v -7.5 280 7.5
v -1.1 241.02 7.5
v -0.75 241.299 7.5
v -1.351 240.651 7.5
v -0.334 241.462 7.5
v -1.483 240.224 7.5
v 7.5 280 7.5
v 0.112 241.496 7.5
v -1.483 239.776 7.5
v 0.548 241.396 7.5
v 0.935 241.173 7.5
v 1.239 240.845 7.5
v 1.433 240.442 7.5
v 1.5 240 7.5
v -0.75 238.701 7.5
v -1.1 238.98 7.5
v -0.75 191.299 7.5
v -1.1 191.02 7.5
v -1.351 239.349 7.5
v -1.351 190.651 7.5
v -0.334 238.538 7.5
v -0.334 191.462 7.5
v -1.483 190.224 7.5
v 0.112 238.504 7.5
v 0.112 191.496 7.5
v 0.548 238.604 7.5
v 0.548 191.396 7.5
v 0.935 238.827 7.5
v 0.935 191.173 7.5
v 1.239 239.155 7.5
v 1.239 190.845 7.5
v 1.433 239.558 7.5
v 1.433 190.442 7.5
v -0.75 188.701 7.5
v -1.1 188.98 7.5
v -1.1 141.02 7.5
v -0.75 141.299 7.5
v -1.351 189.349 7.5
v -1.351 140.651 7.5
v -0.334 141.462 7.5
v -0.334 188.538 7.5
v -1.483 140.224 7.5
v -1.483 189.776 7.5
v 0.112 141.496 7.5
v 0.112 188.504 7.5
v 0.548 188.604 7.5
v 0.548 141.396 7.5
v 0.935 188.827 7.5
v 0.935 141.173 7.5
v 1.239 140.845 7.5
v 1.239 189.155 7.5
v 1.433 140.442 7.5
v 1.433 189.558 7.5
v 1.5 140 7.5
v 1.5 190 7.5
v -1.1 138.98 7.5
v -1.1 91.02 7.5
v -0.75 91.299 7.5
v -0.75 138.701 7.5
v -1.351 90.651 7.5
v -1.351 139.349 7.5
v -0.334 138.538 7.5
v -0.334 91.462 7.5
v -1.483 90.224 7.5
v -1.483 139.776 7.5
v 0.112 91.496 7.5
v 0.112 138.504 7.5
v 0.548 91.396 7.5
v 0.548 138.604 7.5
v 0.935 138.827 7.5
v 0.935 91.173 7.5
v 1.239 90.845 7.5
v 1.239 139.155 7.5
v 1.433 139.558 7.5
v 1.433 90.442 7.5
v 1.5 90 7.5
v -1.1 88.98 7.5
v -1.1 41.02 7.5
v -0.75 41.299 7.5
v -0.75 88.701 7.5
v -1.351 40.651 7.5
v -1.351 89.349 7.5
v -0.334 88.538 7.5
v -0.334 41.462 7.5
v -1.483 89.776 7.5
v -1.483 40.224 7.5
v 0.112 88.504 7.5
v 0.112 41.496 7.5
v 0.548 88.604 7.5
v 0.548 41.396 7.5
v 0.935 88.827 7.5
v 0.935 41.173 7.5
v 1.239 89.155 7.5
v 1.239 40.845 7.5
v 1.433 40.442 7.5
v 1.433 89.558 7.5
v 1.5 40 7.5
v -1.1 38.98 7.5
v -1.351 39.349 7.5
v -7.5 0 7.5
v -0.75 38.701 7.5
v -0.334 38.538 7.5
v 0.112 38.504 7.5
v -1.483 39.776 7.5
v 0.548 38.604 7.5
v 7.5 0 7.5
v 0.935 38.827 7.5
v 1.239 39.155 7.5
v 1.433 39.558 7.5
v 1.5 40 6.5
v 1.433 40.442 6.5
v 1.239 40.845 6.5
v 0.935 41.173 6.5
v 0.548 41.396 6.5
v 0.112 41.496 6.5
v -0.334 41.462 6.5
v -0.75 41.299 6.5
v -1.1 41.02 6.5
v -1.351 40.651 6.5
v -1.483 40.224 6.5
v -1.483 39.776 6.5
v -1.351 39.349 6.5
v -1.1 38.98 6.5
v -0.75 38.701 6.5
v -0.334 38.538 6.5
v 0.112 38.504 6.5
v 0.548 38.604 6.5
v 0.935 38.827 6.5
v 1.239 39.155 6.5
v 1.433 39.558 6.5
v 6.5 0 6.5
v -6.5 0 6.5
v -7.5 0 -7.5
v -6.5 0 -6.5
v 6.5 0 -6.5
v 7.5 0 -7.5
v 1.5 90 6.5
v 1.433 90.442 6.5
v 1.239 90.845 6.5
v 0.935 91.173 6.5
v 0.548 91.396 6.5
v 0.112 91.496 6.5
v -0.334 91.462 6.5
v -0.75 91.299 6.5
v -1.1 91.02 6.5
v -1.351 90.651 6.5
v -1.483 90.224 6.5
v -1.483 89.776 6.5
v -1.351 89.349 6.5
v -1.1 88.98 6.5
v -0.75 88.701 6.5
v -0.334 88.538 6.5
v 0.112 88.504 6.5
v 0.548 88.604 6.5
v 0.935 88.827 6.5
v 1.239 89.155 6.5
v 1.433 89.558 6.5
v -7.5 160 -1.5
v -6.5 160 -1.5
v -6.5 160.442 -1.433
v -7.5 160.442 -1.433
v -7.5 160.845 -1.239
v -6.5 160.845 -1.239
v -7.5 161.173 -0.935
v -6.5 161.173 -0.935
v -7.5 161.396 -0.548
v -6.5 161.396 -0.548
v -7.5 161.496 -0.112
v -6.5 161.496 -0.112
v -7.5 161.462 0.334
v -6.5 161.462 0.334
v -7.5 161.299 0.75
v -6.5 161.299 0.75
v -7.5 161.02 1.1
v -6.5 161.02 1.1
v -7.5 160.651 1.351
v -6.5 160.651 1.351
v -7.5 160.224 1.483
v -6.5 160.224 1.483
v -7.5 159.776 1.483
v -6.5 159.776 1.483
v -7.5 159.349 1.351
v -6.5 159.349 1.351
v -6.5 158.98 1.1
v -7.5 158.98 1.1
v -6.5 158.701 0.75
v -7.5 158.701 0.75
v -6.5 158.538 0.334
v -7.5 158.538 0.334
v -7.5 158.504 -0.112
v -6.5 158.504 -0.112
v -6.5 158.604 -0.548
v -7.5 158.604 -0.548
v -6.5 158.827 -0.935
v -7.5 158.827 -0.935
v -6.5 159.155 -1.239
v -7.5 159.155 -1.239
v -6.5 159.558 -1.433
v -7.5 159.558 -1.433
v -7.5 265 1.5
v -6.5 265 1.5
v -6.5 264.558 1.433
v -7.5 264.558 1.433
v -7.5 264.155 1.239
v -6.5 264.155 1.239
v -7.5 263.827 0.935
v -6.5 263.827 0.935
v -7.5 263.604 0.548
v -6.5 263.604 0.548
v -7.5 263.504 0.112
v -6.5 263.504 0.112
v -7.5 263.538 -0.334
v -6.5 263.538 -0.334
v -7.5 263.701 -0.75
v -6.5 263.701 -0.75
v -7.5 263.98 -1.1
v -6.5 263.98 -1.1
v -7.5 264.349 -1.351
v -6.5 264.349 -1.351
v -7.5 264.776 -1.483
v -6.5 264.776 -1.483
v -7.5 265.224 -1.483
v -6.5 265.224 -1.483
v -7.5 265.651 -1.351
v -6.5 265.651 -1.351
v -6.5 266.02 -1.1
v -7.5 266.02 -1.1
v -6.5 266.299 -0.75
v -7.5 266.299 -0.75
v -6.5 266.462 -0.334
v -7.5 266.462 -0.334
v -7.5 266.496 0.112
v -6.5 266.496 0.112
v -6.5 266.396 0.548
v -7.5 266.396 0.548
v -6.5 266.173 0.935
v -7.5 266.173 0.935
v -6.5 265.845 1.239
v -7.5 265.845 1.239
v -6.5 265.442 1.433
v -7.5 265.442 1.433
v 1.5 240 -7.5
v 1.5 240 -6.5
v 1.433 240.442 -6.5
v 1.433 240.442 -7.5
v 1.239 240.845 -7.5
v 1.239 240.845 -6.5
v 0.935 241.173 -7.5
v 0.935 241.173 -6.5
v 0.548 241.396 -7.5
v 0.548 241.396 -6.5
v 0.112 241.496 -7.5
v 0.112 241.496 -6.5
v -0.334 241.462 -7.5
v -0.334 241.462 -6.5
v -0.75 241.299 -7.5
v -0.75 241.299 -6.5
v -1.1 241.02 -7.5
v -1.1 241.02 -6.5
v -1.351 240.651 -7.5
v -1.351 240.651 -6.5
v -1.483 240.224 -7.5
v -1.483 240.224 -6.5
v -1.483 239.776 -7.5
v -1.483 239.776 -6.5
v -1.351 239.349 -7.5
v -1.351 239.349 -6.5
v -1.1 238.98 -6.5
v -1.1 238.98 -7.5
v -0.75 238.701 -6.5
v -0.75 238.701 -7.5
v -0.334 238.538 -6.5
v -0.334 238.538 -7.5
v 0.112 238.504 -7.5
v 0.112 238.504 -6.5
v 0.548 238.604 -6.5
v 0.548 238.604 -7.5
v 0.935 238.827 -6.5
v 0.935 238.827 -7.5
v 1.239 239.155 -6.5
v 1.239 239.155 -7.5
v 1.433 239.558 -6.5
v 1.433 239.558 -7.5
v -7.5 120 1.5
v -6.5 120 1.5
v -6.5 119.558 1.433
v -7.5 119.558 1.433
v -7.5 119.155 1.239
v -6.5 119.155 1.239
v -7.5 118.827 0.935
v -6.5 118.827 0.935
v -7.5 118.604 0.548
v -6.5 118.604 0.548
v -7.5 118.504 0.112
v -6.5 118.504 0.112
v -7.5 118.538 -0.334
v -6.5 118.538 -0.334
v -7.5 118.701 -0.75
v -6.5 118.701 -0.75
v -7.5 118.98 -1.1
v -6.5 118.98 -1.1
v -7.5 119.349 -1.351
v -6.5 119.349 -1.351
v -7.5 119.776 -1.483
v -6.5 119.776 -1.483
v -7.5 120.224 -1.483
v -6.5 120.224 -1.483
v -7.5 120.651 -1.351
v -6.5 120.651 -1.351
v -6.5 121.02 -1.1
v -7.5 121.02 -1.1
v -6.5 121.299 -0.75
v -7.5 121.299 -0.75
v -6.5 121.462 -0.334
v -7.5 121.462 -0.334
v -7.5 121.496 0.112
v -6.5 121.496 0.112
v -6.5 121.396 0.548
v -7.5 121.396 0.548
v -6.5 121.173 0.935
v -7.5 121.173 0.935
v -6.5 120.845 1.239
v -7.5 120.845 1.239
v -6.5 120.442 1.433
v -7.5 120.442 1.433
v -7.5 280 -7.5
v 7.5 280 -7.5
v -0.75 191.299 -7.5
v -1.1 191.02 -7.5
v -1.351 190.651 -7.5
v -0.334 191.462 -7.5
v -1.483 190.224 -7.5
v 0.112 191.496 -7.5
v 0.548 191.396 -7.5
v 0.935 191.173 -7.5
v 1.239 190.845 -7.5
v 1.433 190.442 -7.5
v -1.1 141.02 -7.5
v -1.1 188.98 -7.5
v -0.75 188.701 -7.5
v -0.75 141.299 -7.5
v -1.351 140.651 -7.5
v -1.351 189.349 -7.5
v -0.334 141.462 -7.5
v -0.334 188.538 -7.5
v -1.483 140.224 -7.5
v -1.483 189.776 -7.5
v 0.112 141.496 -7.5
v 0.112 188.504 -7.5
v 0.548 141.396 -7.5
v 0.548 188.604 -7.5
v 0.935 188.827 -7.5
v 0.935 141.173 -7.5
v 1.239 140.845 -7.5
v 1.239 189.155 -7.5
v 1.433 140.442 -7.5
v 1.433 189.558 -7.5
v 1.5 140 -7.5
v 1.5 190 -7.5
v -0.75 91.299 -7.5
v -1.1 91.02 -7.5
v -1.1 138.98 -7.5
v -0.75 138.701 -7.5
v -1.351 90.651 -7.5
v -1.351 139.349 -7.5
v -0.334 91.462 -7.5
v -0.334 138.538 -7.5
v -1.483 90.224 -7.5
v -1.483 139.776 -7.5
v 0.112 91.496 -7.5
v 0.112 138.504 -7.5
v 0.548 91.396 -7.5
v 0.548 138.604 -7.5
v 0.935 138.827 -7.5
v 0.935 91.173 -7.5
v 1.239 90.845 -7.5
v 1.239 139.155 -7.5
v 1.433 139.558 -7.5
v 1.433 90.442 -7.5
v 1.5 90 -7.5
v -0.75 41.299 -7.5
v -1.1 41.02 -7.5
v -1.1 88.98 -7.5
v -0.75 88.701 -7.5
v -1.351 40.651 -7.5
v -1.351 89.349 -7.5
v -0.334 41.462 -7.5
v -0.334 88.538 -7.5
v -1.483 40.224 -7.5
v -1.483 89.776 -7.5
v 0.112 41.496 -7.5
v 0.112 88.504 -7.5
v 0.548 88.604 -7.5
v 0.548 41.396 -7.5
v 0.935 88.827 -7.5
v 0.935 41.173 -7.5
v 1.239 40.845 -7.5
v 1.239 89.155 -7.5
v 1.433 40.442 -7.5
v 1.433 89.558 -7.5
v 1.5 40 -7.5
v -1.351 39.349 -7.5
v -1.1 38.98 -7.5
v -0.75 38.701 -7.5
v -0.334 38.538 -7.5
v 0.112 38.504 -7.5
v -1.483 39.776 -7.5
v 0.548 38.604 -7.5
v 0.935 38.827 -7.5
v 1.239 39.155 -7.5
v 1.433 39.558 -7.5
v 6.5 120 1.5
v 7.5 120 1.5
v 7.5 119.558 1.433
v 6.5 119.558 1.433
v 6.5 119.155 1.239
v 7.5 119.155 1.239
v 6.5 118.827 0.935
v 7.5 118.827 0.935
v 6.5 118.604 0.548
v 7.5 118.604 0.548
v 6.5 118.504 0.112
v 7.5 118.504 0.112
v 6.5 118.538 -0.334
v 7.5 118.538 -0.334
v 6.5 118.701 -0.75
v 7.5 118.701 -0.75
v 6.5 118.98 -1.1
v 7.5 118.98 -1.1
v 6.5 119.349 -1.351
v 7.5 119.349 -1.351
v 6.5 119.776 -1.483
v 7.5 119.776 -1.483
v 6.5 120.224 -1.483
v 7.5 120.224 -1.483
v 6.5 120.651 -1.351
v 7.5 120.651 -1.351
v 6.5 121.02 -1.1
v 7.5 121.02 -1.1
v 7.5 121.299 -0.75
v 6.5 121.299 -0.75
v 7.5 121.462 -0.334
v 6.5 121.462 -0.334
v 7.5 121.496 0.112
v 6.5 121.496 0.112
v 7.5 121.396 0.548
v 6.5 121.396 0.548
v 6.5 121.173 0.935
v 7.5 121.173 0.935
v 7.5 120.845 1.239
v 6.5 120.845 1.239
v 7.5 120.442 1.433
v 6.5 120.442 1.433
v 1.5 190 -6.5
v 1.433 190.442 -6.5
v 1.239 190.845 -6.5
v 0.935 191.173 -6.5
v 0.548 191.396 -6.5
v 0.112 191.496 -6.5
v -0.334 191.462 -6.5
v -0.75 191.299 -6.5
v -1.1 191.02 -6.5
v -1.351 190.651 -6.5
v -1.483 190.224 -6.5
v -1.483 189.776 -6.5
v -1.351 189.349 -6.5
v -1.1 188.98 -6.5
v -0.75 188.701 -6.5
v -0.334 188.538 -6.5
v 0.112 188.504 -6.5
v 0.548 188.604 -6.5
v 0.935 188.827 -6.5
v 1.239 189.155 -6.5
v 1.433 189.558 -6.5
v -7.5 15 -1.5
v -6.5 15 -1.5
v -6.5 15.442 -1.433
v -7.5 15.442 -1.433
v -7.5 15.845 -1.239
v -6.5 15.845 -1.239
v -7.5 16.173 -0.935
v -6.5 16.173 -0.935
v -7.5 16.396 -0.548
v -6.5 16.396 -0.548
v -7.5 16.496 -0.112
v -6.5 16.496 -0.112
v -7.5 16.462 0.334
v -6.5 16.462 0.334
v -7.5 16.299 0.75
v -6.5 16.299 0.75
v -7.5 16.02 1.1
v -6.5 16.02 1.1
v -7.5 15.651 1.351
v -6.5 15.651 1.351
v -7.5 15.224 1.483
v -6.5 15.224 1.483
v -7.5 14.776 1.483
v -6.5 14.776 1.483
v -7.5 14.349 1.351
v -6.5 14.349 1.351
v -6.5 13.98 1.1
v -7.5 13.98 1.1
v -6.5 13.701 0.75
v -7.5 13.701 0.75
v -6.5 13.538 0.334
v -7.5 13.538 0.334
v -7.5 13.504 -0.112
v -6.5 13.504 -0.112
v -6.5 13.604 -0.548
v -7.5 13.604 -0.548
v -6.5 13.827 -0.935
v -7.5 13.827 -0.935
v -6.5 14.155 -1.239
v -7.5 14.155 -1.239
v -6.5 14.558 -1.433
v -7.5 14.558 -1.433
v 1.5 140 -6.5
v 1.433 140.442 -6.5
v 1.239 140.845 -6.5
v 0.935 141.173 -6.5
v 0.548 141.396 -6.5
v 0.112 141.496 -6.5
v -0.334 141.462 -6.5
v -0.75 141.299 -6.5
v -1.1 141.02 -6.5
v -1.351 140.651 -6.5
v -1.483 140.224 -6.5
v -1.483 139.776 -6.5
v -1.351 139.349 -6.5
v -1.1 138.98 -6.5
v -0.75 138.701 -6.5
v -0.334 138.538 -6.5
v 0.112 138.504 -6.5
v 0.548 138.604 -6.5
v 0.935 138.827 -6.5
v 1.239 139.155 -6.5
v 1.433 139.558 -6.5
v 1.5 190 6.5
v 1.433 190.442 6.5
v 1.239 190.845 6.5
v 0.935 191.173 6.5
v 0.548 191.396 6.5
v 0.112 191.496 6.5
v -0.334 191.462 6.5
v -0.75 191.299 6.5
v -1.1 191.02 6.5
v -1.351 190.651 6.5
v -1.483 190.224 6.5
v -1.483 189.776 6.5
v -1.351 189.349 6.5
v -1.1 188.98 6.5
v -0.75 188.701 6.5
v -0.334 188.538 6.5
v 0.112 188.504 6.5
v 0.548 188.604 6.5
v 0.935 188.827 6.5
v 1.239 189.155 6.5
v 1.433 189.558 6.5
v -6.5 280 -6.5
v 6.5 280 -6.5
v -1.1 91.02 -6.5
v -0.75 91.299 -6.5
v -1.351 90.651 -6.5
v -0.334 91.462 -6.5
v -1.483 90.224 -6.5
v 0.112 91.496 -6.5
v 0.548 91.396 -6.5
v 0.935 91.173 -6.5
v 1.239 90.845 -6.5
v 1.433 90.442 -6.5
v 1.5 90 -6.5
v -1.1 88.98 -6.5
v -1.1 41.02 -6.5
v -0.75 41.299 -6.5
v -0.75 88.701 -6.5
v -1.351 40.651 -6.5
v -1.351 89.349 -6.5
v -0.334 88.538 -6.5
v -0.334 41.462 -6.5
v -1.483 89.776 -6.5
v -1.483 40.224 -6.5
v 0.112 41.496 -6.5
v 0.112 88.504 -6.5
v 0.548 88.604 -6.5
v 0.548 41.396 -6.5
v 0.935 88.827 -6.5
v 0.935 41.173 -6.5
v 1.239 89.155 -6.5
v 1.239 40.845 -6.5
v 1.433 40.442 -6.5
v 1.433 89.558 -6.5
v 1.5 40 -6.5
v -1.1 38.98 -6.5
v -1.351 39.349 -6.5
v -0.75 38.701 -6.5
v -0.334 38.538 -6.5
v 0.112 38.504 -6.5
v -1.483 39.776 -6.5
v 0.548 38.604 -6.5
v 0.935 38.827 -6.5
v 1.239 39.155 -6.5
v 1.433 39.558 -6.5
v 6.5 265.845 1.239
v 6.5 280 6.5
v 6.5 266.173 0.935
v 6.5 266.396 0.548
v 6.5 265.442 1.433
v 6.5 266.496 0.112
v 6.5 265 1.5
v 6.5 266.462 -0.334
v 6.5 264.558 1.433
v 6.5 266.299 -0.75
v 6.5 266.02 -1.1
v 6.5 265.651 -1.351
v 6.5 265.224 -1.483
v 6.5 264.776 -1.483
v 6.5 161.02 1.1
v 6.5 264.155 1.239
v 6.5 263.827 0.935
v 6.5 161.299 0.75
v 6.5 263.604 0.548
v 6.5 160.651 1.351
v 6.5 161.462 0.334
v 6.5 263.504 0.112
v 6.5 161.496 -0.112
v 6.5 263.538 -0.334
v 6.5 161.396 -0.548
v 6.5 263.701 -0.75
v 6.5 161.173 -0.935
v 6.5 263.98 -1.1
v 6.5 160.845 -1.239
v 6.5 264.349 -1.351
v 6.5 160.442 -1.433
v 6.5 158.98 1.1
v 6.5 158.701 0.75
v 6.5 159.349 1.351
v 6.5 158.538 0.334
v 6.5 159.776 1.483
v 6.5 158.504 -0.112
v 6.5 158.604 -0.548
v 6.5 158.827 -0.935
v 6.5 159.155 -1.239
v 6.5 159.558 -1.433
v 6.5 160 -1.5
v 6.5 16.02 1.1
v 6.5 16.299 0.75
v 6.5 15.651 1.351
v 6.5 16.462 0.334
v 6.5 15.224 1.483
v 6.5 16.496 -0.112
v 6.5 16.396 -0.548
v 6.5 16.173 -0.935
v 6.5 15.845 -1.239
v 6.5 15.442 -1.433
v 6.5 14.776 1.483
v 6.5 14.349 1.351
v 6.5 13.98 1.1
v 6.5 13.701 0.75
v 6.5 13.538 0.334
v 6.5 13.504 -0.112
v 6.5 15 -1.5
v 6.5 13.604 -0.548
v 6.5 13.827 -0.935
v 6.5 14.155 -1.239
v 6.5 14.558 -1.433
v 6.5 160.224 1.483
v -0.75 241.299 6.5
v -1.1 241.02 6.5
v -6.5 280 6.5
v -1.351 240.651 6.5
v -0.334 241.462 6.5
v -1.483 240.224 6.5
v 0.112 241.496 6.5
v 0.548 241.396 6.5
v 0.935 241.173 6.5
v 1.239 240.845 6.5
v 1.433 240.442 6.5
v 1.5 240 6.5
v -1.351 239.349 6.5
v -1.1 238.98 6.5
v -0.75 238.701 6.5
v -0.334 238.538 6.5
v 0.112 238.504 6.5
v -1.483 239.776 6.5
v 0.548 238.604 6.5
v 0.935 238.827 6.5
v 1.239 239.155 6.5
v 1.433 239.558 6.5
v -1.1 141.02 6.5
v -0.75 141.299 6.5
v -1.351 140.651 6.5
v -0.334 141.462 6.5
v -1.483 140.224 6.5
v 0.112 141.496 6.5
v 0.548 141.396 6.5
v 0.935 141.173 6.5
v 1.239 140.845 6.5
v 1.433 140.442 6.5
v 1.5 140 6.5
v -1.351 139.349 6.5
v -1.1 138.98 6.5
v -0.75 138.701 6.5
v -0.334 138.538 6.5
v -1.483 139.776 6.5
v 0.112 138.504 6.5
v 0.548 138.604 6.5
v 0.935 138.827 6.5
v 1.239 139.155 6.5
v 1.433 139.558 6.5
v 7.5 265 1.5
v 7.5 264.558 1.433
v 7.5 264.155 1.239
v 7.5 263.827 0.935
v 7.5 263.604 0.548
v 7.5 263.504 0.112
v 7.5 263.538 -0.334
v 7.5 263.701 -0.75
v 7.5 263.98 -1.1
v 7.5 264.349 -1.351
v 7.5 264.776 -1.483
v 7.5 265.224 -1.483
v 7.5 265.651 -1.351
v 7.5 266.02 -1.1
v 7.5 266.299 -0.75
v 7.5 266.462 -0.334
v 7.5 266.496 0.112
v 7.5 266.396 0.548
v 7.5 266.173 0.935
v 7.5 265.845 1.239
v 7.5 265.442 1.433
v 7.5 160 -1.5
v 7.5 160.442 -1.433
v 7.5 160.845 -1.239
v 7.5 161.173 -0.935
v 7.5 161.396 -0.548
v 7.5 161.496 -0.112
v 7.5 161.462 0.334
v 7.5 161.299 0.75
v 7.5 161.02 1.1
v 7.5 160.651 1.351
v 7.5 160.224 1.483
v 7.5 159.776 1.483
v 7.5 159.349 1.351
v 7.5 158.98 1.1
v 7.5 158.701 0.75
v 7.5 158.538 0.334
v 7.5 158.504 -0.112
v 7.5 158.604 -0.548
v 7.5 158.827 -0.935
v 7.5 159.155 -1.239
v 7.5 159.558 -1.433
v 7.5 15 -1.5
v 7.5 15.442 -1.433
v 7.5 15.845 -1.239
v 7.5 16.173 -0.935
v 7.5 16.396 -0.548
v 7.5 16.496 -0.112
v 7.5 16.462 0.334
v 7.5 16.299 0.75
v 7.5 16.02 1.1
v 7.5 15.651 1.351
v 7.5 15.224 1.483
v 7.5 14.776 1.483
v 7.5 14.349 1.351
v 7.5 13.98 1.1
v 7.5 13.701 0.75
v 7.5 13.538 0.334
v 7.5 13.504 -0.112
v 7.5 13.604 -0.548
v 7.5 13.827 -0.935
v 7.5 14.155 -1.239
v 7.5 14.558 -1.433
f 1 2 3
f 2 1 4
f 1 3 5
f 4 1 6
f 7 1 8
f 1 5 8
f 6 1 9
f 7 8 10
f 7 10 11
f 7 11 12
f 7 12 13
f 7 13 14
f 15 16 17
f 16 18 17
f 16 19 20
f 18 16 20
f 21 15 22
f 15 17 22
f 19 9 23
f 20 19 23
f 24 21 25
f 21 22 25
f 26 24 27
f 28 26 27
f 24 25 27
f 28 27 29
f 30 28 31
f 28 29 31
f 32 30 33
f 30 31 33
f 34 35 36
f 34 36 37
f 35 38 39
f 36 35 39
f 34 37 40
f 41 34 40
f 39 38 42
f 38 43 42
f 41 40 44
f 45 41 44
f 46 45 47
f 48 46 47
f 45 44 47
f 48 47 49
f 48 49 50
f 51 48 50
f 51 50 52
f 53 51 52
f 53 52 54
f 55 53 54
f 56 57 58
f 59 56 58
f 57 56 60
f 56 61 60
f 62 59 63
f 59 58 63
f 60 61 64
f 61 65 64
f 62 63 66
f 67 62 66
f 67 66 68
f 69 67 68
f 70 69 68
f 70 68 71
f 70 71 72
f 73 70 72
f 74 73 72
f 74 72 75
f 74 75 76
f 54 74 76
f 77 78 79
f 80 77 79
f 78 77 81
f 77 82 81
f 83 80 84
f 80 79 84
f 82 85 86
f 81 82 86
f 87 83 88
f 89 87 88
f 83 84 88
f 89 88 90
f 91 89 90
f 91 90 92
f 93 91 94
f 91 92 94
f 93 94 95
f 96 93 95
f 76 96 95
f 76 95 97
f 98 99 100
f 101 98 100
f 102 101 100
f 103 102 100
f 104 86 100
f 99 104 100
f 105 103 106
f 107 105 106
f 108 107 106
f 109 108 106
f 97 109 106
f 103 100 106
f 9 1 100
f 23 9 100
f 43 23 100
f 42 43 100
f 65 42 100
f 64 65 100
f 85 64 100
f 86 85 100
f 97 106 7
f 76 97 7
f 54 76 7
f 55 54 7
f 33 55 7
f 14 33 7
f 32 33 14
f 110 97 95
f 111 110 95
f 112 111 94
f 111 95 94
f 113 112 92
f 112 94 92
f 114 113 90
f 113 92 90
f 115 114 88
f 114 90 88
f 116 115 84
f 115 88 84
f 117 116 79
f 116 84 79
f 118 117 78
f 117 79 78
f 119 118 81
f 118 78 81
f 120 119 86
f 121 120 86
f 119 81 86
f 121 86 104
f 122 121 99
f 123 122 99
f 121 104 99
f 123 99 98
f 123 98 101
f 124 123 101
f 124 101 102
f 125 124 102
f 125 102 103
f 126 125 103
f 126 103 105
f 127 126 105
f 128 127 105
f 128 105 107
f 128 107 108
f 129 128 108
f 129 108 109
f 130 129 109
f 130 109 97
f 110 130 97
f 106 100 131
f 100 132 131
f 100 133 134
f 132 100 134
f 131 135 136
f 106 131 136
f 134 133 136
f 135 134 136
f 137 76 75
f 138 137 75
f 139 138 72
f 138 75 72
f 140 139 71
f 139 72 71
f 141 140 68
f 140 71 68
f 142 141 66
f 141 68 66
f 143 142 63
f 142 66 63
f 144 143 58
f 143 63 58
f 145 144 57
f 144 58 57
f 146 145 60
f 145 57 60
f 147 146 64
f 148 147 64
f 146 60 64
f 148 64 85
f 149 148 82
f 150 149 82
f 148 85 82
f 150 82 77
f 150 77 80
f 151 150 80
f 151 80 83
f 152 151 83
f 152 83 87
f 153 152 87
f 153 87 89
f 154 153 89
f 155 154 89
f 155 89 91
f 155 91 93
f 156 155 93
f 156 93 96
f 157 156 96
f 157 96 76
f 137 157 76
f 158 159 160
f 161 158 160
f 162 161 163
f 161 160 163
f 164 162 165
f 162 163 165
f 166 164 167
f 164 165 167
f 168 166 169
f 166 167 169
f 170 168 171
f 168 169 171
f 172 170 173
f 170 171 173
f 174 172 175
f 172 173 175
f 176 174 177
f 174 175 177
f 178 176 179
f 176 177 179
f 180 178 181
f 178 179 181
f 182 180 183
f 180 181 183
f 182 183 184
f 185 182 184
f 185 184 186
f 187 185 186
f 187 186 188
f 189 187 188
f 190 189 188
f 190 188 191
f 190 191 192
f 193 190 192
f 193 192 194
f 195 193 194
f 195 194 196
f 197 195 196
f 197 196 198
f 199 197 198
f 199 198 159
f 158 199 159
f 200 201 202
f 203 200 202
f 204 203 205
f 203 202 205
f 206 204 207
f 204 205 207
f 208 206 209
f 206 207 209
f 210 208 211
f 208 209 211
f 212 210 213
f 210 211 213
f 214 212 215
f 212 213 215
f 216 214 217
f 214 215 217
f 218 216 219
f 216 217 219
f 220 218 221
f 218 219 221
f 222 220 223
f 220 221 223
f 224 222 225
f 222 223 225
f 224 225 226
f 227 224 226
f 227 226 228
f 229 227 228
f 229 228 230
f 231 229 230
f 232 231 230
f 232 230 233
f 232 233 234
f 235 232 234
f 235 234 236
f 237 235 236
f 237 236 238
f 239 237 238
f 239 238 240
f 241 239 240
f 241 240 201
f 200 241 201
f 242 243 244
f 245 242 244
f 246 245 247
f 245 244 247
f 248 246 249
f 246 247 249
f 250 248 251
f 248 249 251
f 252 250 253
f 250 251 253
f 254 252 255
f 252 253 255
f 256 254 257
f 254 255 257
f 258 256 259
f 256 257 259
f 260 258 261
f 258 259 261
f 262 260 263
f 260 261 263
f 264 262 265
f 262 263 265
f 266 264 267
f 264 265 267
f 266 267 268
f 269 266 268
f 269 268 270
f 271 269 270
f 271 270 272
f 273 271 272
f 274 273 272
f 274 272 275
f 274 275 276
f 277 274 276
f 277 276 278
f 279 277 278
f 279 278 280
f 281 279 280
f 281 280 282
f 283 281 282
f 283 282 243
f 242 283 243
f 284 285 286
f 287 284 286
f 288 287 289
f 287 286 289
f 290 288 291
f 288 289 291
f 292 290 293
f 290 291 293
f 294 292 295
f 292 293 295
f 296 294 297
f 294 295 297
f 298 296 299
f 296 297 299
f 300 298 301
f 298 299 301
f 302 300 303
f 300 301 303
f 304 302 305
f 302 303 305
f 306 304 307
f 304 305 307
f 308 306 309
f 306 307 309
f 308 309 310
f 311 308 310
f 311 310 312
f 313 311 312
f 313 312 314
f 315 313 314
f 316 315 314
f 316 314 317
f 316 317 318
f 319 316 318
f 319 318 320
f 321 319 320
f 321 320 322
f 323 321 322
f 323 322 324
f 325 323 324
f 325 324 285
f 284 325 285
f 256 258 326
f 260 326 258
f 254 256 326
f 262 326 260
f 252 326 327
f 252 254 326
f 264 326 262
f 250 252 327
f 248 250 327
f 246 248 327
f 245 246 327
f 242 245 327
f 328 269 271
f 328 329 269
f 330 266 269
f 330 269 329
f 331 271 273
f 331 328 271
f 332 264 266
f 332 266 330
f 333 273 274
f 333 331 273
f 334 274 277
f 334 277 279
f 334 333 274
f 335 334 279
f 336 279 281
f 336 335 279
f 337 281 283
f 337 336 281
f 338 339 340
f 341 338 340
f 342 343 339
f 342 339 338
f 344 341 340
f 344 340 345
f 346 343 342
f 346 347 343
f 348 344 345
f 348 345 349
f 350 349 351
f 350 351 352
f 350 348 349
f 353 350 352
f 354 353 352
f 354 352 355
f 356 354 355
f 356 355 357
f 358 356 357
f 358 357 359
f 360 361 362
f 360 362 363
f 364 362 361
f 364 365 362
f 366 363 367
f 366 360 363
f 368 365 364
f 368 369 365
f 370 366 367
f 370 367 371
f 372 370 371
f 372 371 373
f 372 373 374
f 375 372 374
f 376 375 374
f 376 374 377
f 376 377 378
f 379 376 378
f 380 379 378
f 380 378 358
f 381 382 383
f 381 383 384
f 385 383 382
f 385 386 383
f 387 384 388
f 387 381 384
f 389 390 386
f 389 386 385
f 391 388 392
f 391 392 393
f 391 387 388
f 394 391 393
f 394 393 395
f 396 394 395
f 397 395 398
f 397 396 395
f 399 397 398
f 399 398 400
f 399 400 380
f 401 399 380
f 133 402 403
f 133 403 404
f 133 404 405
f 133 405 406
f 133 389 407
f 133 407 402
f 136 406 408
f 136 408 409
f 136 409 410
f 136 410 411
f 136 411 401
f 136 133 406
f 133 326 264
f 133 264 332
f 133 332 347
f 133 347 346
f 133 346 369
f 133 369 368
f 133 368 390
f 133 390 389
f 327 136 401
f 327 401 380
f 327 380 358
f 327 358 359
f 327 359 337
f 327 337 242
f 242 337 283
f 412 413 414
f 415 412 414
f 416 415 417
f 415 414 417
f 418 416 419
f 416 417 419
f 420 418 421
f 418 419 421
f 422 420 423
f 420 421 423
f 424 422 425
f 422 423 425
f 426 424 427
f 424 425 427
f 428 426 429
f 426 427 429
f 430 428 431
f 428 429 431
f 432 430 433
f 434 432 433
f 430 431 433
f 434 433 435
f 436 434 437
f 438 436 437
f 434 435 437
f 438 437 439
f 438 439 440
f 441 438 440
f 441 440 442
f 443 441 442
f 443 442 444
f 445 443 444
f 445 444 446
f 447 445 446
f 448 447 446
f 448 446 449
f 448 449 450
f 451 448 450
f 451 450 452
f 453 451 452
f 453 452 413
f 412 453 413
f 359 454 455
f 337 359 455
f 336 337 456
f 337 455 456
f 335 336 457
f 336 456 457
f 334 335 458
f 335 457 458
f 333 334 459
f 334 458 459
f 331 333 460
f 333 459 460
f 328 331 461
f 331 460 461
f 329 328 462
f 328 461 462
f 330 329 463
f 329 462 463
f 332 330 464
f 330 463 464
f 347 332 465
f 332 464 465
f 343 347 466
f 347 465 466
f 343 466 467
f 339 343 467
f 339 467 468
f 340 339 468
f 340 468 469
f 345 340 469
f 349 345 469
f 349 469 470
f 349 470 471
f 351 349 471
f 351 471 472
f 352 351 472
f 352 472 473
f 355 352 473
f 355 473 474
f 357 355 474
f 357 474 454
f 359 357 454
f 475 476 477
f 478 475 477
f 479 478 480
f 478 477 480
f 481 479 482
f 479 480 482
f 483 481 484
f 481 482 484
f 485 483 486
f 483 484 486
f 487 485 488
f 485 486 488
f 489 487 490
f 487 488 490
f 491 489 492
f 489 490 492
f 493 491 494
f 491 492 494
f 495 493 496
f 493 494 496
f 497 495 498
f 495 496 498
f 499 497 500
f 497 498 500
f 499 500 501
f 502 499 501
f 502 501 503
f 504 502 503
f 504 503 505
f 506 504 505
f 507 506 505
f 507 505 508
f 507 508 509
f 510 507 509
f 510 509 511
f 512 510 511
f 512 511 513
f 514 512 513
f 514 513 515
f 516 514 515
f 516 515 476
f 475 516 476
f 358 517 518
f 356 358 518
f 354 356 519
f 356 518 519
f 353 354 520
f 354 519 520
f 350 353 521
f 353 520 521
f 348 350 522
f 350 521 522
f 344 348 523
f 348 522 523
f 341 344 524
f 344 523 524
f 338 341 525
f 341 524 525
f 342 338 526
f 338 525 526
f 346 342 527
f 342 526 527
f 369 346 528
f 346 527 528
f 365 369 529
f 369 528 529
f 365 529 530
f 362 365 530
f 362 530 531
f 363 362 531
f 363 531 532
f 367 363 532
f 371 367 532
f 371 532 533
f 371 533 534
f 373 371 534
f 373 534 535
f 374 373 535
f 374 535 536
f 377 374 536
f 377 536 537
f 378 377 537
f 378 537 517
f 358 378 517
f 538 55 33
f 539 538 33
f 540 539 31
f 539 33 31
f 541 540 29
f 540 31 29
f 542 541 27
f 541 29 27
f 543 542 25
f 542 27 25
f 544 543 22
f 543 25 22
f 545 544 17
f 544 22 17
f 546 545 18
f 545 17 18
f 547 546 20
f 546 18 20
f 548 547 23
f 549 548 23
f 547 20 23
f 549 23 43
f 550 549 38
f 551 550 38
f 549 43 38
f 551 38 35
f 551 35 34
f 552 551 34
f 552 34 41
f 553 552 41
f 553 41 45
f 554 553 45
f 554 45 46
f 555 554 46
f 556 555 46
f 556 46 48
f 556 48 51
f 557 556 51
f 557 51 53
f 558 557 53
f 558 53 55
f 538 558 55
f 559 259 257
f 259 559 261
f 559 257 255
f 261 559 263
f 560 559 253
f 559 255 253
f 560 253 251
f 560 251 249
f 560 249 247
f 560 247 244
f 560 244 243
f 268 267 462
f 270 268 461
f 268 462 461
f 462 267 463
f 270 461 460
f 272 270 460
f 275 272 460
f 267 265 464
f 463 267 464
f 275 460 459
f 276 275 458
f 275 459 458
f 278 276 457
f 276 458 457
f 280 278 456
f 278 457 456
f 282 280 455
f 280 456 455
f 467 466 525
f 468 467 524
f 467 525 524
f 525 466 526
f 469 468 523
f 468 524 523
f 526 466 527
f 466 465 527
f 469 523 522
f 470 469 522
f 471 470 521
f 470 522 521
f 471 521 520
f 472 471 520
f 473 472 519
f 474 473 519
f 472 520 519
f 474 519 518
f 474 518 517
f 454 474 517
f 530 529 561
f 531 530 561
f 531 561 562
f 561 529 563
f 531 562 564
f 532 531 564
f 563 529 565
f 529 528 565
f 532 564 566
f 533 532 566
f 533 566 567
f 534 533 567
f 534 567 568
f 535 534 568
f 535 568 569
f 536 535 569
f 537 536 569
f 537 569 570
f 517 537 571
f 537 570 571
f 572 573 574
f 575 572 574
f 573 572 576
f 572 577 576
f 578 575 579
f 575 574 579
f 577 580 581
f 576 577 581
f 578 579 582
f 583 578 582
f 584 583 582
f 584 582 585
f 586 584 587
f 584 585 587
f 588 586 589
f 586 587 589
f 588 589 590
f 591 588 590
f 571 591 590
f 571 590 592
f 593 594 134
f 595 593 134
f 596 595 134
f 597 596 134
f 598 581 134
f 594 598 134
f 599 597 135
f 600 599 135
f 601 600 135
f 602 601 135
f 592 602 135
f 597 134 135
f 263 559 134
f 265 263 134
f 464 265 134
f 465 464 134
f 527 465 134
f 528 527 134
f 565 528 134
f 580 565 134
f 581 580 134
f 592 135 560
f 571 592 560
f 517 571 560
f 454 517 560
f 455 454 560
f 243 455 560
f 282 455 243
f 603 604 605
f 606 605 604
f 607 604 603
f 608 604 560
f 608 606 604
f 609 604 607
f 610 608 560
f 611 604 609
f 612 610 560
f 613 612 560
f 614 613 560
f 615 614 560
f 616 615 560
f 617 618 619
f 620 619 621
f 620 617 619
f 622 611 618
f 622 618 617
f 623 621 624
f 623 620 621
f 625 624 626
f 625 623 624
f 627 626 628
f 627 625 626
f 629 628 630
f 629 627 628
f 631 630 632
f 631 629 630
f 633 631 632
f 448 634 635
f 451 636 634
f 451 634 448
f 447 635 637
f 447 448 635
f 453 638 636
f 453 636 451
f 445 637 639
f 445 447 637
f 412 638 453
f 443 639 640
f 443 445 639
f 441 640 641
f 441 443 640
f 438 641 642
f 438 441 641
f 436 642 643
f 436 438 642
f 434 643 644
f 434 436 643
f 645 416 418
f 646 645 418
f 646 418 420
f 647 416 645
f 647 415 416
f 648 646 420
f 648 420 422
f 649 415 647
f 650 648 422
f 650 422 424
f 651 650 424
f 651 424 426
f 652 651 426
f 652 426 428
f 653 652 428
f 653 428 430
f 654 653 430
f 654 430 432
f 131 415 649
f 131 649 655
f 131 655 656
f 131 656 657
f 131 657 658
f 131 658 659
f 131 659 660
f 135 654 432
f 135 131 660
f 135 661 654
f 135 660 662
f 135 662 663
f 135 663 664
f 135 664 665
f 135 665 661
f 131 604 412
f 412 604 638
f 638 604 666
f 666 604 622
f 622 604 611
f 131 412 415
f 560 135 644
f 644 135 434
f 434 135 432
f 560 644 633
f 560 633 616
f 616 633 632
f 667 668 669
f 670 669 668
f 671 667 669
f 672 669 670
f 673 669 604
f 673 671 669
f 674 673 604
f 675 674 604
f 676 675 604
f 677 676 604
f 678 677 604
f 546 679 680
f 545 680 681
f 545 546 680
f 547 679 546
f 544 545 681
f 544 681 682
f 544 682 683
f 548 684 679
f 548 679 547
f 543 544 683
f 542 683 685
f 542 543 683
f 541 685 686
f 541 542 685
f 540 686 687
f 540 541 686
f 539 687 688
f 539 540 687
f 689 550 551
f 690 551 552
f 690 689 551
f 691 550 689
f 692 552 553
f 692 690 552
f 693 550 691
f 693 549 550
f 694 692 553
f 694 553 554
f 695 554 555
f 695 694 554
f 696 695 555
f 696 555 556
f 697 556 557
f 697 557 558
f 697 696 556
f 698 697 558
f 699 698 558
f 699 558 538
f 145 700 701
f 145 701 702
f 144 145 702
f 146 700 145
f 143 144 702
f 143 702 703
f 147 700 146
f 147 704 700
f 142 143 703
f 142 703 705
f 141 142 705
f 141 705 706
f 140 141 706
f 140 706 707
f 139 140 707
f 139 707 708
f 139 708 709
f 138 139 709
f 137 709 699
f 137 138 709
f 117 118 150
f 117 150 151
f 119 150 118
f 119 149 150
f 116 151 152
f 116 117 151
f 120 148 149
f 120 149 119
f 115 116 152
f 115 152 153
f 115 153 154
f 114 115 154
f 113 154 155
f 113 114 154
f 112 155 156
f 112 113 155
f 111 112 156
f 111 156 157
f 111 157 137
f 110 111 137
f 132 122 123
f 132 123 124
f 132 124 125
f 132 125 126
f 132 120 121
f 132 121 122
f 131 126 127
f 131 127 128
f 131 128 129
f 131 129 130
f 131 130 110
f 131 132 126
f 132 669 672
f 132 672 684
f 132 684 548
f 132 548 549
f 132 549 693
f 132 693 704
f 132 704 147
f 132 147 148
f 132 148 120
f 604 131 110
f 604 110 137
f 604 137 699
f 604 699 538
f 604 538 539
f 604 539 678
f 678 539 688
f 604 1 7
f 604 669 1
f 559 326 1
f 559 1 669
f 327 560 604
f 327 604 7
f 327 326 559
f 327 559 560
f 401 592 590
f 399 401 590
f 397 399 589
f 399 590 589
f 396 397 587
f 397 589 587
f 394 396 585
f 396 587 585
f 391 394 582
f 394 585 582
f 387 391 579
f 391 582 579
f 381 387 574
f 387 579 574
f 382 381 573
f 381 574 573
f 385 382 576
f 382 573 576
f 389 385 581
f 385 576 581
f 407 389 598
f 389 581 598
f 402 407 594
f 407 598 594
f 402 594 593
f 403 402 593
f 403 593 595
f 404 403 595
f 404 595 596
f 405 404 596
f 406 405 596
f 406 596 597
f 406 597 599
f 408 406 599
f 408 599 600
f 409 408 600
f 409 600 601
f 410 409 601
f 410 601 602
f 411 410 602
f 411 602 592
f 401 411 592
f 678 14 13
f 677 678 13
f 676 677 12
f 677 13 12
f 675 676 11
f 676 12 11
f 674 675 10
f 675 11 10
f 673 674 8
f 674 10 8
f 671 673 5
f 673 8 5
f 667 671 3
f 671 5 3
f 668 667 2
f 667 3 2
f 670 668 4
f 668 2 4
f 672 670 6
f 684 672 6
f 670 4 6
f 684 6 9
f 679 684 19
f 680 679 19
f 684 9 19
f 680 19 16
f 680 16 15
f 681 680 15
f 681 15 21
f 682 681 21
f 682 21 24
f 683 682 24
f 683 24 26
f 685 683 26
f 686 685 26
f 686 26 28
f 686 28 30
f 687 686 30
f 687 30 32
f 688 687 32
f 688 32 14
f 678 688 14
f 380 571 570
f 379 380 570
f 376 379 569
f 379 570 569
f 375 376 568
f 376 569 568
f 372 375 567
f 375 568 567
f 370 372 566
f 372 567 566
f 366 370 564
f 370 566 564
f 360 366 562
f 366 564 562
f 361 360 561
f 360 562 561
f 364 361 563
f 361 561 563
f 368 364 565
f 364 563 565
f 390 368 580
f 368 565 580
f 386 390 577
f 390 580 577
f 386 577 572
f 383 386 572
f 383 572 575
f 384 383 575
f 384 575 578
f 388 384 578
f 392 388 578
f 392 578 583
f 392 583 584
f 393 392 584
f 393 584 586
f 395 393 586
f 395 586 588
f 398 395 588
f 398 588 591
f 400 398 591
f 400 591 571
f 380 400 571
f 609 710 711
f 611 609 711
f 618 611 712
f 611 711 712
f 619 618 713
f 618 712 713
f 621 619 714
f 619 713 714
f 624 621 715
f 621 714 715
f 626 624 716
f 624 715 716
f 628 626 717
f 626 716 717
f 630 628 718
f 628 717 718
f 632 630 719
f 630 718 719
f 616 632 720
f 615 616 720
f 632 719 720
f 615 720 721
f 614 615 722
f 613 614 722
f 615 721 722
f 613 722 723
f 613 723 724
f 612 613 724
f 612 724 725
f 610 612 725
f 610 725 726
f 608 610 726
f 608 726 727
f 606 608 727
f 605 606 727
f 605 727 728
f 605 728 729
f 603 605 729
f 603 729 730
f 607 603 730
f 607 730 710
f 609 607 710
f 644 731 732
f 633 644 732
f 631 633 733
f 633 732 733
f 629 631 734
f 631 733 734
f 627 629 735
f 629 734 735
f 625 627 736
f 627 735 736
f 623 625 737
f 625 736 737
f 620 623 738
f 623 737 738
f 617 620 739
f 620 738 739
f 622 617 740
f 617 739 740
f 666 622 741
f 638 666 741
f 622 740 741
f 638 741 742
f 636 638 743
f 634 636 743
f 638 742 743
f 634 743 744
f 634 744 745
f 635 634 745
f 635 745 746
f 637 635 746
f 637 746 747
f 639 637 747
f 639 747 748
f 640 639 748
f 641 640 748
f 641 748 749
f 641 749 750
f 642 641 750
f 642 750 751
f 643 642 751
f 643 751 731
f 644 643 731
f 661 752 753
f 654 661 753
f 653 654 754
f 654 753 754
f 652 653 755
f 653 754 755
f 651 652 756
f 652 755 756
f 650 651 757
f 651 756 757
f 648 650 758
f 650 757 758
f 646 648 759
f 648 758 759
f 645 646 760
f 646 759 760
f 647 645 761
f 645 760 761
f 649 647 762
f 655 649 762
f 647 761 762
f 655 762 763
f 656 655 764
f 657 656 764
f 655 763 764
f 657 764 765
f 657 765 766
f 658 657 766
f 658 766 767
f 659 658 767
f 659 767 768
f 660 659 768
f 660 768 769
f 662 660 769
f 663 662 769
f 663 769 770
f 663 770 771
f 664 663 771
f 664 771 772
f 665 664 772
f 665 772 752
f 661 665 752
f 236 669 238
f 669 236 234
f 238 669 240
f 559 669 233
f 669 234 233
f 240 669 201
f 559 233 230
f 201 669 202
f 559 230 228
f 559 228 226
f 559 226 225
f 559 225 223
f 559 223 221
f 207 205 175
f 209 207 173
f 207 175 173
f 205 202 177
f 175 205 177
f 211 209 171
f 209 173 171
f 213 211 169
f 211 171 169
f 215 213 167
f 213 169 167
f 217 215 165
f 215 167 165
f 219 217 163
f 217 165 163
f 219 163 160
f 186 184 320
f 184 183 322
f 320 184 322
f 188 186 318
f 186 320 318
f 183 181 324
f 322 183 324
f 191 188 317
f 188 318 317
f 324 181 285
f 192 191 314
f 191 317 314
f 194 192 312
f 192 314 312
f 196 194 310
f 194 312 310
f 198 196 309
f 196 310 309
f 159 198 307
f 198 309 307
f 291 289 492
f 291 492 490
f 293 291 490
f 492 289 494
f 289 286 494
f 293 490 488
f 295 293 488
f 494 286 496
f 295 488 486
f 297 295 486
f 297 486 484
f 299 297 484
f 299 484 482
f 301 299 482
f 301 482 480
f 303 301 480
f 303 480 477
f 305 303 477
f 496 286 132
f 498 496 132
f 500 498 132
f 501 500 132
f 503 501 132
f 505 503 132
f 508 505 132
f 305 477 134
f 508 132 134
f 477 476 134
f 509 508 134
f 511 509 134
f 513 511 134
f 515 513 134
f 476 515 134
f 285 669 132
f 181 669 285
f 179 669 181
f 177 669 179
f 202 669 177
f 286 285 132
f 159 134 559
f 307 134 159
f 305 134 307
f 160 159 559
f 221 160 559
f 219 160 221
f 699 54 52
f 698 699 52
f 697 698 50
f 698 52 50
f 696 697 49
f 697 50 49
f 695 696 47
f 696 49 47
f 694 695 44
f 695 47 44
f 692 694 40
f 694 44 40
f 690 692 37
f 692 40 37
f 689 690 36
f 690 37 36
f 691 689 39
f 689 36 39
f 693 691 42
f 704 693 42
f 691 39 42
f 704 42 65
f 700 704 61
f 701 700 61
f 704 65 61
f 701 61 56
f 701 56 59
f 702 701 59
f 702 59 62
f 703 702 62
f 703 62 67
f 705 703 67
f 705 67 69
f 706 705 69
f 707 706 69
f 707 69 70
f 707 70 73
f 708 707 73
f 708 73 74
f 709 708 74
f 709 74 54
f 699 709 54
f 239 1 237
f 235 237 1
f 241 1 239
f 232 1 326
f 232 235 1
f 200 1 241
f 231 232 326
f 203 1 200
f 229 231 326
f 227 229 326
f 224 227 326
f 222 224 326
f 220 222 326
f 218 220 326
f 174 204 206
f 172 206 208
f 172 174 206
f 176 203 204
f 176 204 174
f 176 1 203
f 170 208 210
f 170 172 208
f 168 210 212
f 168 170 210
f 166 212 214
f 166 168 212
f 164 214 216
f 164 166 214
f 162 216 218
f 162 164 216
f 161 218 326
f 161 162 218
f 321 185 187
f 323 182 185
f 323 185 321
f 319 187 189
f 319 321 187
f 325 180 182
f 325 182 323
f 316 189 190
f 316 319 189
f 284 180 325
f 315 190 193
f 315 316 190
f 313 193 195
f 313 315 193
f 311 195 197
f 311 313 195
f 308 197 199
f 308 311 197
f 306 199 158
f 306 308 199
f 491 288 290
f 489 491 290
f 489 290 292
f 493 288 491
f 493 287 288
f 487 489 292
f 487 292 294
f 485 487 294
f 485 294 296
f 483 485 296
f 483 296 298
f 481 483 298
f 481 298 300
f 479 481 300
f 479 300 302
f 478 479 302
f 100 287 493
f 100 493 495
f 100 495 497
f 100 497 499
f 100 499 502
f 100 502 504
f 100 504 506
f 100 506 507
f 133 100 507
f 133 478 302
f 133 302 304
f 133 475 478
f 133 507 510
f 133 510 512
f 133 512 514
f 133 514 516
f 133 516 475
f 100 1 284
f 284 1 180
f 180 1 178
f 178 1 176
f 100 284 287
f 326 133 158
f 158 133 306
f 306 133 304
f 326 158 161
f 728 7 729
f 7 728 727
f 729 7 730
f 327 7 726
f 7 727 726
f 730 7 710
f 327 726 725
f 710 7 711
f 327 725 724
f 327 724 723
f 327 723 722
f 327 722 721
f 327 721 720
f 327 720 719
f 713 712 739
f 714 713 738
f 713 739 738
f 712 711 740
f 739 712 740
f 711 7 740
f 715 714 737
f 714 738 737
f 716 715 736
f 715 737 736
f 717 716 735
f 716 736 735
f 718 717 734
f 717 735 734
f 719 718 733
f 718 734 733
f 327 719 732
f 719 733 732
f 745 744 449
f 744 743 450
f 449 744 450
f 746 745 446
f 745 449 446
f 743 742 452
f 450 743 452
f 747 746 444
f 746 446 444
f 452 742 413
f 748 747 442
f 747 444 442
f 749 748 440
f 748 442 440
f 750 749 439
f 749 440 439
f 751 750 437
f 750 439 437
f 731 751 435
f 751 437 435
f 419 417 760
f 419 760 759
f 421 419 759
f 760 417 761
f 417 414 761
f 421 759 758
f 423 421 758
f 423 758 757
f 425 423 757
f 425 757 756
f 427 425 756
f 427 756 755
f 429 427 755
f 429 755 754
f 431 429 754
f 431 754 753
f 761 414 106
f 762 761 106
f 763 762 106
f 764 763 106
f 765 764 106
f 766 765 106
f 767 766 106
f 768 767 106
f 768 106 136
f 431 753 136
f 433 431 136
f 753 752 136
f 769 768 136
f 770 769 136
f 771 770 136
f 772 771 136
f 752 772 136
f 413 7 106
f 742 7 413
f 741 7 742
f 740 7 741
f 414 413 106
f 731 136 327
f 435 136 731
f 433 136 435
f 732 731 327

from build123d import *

# Parameters (mm, degrees)
SKETCH_1_W          = 15
SKETCH_1_H          = 15
SKETCH_1_W_2        = 13
SKETCH_1_H_2        = 13
EXTRUDE_1_DEPTH     = 280
SKETCH_2_R          = 1.5
CUT_EXTRUDE_1_DEPTH = 281.501782526
SKETCH_3_R          = 1.5
CUT_EXTRUDE_2_DEPTH = 281.501782526


with BuildPart() as part:
    # 草图1 → 凸台-拉伸1 (new body)
    with BuildSketch(Plane(origin=(0, 0, 0), x_dir=(1, 0, 0), z_dir=(0, 1, 0))):
        Rectangle(SKETCH_1_W, SKETCH_1_H)
        Rectangle(SKETCH_1_W_2, SKETCH_1_H_2, mode=Mode.SUBTRACT)
    extrude(amount=EXTRUDE_1_DEPTH)

    # 草图2 → 切除-拉伸1 (cut, through all)
    with BuildSketch(Plane.XY.offset(7.5)):
        with Locations((0, 40)):
            Circle(SKETCH_2_R)
        with Locations((0, 140)):
            Circle(SKETCH_2_R)
        with Locations((0, 90)):
            Circle(SKETCH_2_R)
        with Locations((0, 240)):
            Circle(SKETCH_2_R)
        with Locations((0, 190)):
            Circle(SKETCH_2_R)
    extrude(amount=-CUT_EXTRUDE_1_DEPTH, mode=Mode.SUBTRACT)

    # 草图3 → 切除-拉伸2 (cut, through all)
    with BuildSketch(Plane(origin=(7.5, 0, 0), x_dir=(0, 0, -1), z_dir=(1, 0, 0))):
        with Locations((0, 160)):
            Circle(SKETCH_3_R)
        with Locations(Location((0, 120, 0), (0, 0, 180))):
            Circle(SKETCH_3_R)
        with Locations((0, 15)):
            Circle(SKETCH_3_R)
        with Locations(Location((0, 265, 0), (0, 0, 180))):
            Circle(SKETCH_3_R)
    extrude(amount=-CUT_EXTRUDE_2_DEPTH, mode=Mode.SUBTRACT)


solid = part.part
